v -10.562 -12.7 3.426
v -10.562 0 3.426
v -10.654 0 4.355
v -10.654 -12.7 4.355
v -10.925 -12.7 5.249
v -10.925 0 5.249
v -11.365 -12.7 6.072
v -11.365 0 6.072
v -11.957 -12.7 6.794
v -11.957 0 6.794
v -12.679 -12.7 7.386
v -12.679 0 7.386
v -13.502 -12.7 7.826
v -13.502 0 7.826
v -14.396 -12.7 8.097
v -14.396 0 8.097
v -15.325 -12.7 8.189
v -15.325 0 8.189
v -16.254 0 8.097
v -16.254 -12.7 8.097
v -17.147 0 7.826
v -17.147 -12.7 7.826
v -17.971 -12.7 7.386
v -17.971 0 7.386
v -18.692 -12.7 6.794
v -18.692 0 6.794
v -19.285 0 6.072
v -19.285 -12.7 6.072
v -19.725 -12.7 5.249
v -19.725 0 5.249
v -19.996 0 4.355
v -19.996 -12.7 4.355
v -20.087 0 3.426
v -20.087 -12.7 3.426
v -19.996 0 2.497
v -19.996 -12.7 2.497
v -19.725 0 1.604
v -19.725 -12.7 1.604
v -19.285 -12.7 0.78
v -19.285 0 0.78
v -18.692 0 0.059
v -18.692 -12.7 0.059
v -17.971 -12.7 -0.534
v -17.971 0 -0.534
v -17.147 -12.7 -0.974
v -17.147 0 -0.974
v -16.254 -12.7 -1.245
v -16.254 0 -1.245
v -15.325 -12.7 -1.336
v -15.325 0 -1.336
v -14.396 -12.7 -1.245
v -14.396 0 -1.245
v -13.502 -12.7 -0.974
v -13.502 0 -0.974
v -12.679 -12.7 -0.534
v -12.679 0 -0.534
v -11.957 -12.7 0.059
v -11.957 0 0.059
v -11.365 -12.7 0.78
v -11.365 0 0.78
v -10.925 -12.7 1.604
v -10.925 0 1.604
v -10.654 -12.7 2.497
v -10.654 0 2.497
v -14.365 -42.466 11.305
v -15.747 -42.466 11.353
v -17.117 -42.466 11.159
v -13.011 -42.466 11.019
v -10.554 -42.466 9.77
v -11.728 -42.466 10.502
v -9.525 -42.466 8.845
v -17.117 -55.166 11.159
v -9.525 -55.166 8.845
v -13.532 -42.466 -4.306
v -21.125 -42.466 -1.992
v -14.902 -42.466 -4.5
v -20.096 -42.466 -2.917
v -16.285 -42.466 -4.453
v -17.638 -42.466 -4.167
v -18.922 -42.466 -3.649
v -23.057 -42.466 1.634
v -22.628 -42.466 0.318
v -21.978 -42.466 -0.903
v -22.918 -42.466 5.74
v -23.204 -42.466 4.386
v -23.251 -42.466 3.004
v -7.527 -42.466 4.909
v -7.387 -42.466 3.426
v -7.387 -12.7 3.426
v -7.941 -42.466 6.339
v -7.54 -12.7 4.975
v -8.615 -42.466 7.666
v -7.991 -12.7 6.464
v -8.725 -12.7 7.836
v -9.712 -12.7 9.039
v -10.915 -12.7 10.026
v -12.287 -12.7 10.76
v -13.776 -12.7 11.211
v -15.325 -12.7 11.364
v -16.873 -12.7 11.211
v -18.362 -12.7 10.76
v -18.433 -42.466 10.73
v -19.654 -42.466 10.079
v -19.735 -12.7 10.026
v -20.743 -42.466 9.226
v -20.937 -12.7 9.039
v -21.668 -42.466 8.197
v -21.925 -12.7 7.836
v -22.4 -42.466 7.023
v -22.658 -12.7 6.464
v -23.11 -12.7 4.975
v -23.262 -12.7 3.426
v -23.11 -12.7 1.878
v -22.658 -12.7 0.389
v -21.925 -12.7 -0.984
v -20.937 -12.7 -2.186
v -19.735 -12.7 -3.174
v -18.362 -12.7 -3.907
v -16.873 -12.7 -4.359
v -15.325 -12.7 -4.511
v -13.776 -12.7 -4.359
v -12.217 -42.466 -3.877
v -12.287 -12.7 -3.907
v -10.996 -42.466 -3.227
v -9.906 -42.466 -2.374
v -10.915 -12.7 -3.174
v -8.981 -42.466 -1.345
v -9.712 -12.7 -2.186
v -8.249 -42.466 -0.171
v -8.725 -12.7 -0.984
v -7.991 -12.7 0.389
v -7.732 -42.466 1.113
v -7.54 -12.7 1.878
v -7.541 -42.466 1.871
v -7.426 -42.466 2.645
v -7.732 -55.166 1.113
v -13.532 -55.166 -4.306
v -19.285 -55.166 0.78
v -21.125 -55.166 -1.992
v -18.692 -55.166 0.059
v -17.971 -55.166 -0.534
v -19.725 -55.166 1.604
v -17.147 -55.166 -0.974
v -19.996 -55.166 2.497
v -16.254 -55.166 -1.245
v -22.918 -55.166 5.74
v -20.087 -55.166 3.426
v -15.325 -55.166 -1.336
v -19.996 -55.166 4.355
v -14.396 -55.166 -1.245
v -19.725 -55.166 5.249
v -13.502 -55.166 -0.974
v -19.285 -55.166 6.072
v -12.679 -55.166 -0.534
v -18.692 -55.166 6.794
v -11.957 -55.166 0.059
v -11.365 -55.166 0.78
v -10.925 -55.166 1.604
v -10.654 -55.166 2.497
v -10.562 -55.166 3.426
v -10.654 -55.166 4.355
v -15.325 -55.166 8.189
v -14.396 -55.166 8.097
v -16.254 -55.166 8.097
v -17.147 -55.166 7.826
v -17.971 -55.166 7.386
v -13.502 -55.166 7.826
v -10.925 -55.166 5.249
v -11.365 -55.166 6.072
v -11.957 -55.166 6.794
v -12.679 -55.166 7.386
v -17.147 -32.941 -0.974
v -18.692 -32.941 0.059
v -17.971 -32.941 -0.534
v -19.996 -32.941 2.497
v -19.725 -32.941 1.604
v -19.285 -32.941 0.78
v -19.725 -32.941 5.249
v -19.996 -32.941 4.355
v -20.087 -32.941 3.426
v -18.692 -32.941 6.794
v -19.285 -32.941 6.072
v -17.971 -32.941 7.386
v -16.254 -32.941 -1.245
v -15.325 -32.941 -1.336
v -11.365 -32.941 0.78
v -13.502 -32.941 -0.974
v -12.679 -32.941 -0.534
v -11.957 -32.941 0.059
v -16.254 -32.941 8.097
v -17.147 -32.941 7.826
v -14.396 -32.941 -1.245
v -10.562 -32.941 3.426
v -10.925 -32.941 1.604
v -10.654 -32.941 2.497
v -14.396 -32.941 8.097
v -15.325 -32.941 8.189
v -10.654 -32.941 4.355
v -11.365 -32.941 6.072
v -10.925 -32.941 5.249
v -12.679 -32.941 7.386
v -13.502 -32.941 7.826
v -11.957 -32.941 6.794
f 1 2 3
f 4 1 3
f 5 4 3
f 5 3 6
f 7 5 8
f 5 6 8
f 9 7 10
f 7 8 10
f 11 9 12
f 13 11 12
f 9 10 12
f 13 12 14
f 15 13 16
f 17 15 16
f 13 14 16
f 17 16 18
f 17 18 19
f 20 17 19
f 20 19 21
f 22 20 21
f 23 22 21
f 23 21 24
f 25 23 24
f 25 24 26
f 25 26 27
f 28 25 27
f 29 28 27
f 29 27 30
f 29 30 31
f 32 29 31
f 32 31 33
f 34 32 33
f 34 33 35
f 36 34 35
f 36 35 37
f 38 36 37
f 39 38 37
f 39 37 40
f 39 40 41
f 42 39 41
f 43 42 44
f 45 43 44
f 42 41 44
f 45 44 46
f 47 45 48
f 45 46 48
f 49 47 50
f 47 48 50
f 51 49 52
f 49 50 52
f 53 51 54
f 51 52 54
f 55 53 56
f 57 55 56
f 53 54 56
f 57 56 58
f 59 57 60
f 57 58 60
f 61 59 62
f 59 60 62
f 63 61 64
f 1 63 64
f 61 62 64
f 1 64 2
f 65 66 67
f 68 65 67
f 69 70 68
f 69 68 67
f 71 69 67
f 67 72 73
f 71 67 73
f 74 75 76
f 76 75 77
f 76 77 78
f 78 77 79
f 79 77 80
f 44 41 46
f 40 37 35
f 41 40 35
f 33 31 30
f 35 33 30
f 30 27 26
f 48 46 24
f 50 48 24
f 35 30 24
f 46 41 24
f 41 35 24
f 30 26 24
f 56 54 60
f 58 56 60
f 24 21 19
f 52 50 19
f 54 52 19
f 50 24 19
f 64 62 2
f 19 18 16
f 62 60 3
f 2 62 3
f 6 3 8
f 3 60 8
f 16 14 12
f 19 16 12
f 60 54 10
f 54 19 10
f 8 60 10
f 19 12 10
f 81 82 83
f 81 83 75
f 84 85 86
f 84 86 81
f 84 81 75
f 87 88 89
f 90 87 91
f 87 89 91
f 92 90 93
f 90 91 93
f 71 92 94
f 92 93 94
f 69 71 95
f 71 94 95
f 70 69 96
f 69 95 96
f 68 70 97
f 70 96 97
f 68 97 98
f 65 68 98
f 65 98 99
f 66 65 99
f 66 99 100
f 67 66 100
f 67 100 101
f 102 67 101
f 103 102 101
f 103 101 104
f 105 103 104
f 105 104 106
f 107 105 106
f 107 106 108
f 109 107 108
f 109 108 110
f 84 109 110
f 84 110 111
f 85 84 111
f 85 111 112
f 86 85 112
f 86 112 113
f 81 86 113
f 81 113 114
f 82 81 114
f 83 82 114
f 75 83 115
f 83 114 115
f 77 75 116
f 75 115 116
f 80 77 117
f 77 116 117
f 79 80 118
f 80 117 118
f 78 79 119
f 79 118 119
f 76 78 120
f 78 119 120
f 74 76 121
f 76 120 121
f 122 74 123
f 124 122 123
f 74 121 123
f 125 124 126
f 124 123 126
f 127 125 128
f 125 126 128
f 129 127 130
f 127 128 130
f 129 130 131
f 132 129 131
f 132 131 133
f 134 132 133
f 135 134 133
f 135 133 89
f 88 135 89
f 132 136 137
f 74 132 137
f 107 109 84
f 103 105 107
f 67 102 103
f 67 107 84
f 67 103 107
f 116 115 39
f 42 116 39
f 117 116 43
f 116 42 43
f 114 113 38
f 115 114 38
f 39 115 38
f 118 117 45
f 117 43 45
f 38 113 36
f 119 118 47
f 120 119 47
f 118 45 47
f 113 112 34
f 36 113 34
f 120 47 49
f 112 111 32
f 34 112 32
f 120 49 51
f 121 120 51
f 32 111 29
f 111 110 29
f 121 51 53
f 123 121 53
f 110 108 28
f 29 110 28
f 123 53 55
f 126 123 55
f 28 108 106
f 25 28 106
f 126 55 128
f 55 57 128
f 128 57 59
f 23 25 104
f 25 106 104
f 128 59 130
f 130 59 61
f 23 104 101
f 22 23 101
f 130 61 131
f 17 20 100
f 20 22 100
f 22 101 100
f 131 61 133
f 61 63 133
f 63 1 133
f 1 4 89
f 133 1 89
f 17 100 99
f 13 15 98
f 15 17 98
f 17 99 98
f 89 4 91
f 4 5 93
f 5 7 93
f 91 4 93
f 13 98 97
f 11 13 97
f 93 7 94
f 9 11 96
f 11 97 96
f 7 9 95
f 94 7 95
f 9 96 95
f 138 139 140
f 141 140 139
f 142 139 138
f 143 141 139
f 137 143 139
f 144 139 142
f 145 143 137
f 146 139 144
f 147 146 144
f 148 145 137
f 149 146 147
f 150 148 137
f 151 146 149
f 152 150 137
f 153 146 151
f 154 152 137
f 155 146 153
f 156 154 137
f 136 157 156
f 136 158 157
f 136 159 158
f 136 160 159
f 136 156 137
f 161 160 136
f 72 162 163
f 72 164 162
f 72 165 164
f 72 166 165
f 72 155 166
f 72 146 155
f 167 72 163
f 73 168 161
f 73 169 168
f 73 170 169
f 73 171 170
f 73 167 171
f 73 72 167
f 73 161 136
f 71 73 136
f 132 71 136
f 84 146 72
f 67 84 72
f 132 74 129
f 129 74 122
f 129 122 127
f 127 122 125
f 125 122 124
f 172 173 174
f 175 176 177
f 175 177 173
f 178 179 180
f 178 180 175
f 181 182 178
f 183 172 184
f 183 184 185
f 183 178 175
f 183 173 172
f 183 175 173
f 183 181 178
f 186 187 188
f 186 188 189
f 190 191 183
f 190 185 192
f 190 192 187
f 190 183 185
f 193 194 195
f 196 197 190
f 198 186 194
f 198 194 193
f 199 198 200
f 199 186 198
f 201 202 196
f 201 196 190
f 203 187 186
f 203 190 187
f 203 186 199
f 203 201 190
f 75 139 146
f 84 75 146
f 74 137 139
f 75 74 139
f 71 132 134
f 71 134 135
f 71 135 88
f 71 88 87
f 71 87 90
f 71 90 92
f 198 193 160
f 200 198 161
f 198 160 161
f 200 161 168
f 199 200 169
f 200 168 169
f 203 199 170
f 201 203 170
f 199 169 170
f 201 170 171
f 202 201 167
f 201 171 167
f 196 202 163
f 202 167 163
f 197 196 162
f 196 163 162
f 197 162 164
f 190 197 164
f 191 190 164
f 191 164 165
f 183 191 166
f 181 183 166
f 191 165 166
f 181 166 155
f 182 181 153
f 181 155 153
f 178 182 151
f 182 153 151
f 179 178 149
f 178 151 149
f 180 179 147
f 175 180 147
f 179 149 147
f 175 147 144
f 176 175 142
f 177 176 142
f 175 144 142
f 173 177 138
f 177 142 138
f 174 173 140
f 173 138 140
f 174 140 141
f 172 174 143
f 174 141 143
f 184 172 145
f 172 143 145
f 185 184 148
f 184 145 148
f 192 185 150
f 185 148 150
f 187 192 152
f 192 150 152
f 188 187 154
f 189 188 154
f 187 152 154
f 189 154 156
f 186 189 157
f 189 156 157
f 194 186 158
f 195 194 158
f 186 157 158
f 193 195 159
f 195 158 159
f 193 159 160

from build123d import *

# Parameters (mm, degrees)
F0_R     = 9.525
F1_DEPTH = 44.45
F2_DEPTH = 19.05
F3_R     = 15.875
F3_R_2   = 9.525
F4_DEPTH = 84.93252
F5_R     = 9.525
F6_DEPTH = 44.45
F8_DEPTH = 25.4
F9_SCALE = 0.5


with BuildPart() as f1:
    # F0 (on Front) → F1 (new body)
    with BuildSketch(Plane.XZ):
        with Locations((-30.6494925171, 6.8525290117)):
            Circle(F0_R)
    extrude(amount=F1_DEPTH)

    # F2 (cut): a face of the model
    f2_faces = [f1.faces().sort_by_distance(p)[0] for p in [
        (-30.6494925171, -44.45, 6.8525290117),
    ]]
    extrude(f2_faces, amount=-F2_DEPTH, mode=Mode.SUBTRACT)

    # F3 (on face) → F4 (join)
    with BuildSketch(Plane.XZ.offset(25.4)):
        with Locations((-30.6494925171, 6.8525290117)):
            Circle(F3_R)
        with Locations((-30.6494925171, 6.8525290117)):
            Circle(F3_R_2, mode=Mode.SUBTRACT)
        with Locations((-30.6494925171, 6.8525290117)):
            Circle(F3_R_2)
    extrude(amount=F4_DEPTH)

    # F5 (on face) → F6 (cut)
    with BuildSketch(Plane.XZ.offset(110.33252)):
        with Locations((-30.6494925171, 6.8525290117)):
            Circle(F5_R)
    extrude(amount=-F6_DEPTH, mode=Mode.SUBTRACT)

    # F7 (on face) → F8 (cut)
    with BuildSketch(Plane.XZ.offset(110.33252)):
        with BuildLine():
            Line((-45.8350943452, 11.4799604934), (-34.2348202137, 22.3173617074))
            ThreePointArc((-34.2348202137, 22.3173617074), (-41.4868937311, 18.4528031432), (-45.8350943452, 11.4799604934))
        make_face()
        with BuildLine():
            Line((-42.2497666486, -3.9848722024), (-45.8350943452, 11.4799604934))
            ThreePointArc((-45.8350943452, 11.4799604934), (-46.1143252129, 3.2672013151), (-42.2497666486, -3.9848722024))
        make_face()
        with BuildLine():
            ThreePointArc((-42.2497666486, -3.9848722024), (-35.2769239989, -8.3330728164), (-27.0641648205, -8.6123036841))
            Line((-27.0641648205, -8.6123036841), (-42.2497666486, -3.9848722024))
        make_face()
        with BuildLine():
            ThreePointArc((-27.0641648205, -8.6123036841), (-19.8120913031, -4.7477451198), (-15.463890689, 2.2250975299))
            Line((-15.463890689, 2.2250975299), (-27.0641648205, -8.6123036841))
        make_face()
        with BuildLine():
            ThreePointArc((-14.7744925171, 6.8525290117), (-15.8817916663, 12.6775300058), (-19.0492183856, 17.6899302257))
            Line((-19.0492183856, 17.6899302257), (-15.463890689, 2.2250975299))
            ThreePointArc((-15.463890689, 2.2250975299), (-14.9477879278, 4.5132774242), (-14.7744925171, 6.8525290117))
        make_face()
        with BuildLine():
            Line((-34.2348202137, 22.3173617074), (-19.0492183856, 17.6899302257))
            ThreePointArc((-19.0492183856, 17.6899302257), (-26.0220610354, 22.0381308398), (-34.2348202137, 22.3173617074))
        make_face()
    extrude(amount=-F8_DEPTH, mode=Mode.SUBTRACT)


with BuildPart() as f1_1:
    # F9: moved
    add(f1.part.scale(F9_SCALE))


solid = f1_1.part
